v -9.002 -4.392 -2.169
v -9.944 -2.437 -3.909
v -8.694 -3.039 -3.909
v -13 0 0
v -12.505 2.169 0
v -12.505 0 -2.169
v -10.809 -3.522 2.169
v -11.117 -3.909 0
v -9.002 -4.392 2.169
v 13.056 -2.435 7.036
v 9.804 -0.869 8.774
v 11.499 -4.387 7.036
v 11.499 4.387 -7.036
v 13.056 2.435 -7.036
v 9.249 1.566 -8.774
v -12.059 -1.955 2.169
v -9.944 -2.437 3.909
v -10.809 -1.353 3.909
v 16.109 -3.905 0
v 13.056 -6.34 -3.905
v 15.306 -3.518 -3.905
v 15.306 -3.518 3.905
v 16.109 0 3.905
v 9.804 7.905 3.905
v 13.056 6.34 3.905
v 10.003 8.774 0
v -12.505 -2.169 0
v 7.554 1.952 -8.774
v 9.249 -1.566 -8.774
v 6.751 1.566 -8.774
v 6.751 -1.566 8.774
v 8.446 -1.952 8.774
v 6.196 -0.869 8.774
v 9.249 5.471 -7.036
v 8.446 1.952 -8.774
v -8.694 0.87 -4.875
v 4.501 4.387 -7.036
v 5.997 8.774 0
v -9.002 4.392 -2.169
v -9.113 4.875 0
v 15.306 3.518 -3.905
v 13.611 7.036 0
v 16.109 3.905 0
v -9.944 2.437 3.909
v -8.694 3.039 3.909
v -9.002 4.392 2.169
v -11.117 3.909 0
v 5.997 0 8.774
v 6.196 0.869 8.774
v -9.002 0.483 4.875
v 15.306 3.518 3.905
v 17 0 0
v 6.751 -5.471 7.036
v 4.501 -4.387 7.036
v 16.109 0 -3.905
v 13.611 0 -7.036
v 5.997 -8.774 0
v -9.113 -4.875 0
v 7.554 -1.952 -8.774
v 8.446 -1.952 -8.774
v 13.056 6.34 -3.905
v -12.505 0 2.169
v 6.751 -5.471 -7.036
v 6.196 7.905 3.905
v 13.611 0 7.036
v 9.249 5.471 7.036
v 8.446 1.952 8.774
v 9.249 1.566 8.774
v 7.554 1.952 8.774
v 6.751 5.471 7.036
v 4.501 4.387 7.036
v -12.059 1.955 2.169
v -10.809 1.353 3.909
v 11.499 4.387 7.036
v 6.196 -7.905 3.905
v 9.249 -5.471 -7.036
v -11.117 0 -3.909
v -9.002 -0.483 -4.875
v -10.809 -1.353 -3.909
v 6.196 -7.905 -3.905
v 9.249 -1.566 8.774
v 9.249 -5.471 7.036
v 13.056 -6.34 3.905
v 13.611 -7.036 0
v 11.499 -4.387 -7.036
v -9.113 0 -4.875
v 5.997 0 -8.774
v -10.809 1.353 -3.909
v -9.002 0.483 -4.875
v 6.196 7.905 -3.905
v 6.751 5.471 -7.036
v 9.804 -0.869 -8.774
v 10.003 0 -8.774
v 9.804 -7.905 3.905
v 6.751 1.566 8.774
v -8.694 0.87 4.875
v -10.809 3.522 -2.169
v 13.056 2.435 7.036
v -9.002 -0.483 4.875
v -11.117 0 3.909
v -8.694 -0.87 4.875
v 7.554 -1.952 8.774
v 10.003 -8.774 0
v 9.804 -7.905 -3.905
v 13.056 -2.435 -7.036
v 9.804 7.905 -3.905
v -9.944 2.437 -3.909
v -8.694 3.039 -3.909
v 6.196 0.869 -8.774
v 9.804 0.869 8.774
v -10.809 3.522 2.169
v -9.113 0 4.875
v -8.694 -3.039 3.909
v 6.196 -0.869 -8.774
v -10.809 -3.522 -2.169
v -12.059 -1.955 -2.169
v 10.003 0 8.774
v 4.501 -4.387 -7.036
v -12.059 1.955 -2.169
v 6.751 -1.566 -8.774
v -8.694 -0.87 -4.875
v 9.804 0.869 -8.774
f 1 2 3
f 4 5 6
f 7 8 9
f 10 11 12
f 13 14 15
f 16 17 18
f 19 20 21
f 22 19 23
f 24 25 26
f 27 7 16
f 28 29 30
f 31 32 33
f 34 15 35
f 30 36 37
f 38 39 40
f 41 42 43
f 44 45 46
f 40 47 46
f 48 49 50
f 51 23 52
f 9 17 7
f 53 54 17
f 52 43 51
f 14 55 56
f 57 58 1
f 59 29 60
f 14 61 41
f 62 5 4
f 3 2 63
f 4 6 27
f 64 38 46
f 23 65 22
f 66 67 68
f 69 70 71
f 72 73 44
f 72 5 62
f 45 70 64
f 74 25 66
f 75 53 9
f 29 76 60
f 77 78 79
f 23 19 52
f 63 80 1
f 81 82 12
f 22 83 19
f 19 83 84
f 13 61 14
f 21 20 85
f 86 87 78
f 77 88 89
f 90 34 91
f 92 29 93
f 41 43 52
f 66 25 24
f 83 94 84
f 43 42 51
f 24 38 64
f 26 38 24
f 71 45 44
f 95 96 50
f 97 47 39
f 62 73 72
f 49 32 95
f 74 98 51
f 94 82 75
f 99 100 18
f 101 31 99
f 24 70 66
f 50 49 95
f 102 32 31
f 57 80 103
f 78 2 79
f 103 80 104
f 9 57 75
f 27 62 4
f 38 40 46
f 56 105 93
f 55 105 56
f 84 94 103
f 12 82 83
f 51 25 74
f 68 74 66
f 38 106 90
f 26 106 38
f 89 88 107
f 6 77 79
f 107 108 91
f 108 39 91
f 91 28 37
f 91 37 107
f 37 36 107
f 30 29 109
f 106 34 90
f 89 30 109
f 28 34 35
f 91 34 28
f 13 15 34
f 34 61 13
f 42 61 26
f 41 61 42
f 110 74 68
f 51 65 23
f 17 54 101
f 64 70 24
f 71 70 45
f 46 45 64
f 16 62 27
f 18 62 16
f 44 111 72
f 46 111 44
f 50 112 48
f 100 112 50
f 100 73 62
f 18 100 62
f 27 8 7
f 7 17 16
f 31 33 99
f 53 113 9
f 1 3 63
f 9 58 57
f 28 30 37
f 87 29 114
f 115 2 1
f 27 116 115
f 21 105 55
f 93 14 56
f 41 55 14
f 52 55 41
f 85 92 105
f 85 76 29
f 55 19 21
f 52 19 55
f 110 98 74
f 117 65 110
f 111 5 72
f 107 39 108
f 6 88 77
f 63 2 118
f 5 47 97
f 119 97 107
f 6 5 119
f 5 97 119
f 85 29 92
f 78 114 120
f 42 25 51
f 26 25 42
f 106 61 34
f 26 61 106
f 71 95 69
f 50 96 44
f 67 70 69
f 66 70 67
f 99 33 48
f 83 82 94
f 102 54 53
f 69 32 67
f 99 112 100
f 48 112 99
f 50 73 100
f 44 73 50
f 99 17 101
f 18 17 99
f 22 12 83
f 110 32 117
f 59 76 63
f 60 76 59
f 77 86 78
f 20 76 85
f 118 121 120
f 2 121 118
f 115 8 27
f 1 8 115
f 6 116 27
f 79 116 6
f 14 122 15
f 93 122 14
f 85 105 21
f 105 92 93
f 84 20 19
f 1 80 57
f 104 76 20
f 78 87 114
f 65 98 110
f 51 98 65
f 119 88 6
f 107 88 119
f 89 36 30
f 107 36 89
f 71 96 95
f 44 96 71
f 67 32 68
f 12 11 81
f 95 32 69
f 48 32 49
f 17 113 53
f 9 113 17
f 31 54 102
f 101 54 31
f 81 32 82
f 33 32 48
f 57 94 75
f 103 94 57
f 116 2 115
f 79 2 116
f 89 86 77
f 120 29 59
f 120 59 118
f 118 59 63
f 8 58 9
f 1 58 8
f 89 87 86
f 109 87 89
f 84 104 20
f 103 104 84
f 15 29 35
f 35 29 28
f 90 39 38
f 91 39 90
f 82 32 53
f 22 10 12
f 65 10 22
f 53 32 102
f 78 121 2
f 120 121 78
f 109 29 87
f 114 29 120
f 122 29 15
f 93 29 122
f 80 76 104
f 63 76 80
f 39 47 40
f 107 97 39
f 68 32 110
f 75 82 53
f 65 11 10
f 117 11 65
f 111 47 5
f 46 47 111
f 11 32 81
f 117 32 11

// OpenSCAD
$fn = 14;
hull() {
    translate([-8, 0, 0]) sphere(r = 5);
    translate([8, 0, 0]) sphere(r = 9);
}
